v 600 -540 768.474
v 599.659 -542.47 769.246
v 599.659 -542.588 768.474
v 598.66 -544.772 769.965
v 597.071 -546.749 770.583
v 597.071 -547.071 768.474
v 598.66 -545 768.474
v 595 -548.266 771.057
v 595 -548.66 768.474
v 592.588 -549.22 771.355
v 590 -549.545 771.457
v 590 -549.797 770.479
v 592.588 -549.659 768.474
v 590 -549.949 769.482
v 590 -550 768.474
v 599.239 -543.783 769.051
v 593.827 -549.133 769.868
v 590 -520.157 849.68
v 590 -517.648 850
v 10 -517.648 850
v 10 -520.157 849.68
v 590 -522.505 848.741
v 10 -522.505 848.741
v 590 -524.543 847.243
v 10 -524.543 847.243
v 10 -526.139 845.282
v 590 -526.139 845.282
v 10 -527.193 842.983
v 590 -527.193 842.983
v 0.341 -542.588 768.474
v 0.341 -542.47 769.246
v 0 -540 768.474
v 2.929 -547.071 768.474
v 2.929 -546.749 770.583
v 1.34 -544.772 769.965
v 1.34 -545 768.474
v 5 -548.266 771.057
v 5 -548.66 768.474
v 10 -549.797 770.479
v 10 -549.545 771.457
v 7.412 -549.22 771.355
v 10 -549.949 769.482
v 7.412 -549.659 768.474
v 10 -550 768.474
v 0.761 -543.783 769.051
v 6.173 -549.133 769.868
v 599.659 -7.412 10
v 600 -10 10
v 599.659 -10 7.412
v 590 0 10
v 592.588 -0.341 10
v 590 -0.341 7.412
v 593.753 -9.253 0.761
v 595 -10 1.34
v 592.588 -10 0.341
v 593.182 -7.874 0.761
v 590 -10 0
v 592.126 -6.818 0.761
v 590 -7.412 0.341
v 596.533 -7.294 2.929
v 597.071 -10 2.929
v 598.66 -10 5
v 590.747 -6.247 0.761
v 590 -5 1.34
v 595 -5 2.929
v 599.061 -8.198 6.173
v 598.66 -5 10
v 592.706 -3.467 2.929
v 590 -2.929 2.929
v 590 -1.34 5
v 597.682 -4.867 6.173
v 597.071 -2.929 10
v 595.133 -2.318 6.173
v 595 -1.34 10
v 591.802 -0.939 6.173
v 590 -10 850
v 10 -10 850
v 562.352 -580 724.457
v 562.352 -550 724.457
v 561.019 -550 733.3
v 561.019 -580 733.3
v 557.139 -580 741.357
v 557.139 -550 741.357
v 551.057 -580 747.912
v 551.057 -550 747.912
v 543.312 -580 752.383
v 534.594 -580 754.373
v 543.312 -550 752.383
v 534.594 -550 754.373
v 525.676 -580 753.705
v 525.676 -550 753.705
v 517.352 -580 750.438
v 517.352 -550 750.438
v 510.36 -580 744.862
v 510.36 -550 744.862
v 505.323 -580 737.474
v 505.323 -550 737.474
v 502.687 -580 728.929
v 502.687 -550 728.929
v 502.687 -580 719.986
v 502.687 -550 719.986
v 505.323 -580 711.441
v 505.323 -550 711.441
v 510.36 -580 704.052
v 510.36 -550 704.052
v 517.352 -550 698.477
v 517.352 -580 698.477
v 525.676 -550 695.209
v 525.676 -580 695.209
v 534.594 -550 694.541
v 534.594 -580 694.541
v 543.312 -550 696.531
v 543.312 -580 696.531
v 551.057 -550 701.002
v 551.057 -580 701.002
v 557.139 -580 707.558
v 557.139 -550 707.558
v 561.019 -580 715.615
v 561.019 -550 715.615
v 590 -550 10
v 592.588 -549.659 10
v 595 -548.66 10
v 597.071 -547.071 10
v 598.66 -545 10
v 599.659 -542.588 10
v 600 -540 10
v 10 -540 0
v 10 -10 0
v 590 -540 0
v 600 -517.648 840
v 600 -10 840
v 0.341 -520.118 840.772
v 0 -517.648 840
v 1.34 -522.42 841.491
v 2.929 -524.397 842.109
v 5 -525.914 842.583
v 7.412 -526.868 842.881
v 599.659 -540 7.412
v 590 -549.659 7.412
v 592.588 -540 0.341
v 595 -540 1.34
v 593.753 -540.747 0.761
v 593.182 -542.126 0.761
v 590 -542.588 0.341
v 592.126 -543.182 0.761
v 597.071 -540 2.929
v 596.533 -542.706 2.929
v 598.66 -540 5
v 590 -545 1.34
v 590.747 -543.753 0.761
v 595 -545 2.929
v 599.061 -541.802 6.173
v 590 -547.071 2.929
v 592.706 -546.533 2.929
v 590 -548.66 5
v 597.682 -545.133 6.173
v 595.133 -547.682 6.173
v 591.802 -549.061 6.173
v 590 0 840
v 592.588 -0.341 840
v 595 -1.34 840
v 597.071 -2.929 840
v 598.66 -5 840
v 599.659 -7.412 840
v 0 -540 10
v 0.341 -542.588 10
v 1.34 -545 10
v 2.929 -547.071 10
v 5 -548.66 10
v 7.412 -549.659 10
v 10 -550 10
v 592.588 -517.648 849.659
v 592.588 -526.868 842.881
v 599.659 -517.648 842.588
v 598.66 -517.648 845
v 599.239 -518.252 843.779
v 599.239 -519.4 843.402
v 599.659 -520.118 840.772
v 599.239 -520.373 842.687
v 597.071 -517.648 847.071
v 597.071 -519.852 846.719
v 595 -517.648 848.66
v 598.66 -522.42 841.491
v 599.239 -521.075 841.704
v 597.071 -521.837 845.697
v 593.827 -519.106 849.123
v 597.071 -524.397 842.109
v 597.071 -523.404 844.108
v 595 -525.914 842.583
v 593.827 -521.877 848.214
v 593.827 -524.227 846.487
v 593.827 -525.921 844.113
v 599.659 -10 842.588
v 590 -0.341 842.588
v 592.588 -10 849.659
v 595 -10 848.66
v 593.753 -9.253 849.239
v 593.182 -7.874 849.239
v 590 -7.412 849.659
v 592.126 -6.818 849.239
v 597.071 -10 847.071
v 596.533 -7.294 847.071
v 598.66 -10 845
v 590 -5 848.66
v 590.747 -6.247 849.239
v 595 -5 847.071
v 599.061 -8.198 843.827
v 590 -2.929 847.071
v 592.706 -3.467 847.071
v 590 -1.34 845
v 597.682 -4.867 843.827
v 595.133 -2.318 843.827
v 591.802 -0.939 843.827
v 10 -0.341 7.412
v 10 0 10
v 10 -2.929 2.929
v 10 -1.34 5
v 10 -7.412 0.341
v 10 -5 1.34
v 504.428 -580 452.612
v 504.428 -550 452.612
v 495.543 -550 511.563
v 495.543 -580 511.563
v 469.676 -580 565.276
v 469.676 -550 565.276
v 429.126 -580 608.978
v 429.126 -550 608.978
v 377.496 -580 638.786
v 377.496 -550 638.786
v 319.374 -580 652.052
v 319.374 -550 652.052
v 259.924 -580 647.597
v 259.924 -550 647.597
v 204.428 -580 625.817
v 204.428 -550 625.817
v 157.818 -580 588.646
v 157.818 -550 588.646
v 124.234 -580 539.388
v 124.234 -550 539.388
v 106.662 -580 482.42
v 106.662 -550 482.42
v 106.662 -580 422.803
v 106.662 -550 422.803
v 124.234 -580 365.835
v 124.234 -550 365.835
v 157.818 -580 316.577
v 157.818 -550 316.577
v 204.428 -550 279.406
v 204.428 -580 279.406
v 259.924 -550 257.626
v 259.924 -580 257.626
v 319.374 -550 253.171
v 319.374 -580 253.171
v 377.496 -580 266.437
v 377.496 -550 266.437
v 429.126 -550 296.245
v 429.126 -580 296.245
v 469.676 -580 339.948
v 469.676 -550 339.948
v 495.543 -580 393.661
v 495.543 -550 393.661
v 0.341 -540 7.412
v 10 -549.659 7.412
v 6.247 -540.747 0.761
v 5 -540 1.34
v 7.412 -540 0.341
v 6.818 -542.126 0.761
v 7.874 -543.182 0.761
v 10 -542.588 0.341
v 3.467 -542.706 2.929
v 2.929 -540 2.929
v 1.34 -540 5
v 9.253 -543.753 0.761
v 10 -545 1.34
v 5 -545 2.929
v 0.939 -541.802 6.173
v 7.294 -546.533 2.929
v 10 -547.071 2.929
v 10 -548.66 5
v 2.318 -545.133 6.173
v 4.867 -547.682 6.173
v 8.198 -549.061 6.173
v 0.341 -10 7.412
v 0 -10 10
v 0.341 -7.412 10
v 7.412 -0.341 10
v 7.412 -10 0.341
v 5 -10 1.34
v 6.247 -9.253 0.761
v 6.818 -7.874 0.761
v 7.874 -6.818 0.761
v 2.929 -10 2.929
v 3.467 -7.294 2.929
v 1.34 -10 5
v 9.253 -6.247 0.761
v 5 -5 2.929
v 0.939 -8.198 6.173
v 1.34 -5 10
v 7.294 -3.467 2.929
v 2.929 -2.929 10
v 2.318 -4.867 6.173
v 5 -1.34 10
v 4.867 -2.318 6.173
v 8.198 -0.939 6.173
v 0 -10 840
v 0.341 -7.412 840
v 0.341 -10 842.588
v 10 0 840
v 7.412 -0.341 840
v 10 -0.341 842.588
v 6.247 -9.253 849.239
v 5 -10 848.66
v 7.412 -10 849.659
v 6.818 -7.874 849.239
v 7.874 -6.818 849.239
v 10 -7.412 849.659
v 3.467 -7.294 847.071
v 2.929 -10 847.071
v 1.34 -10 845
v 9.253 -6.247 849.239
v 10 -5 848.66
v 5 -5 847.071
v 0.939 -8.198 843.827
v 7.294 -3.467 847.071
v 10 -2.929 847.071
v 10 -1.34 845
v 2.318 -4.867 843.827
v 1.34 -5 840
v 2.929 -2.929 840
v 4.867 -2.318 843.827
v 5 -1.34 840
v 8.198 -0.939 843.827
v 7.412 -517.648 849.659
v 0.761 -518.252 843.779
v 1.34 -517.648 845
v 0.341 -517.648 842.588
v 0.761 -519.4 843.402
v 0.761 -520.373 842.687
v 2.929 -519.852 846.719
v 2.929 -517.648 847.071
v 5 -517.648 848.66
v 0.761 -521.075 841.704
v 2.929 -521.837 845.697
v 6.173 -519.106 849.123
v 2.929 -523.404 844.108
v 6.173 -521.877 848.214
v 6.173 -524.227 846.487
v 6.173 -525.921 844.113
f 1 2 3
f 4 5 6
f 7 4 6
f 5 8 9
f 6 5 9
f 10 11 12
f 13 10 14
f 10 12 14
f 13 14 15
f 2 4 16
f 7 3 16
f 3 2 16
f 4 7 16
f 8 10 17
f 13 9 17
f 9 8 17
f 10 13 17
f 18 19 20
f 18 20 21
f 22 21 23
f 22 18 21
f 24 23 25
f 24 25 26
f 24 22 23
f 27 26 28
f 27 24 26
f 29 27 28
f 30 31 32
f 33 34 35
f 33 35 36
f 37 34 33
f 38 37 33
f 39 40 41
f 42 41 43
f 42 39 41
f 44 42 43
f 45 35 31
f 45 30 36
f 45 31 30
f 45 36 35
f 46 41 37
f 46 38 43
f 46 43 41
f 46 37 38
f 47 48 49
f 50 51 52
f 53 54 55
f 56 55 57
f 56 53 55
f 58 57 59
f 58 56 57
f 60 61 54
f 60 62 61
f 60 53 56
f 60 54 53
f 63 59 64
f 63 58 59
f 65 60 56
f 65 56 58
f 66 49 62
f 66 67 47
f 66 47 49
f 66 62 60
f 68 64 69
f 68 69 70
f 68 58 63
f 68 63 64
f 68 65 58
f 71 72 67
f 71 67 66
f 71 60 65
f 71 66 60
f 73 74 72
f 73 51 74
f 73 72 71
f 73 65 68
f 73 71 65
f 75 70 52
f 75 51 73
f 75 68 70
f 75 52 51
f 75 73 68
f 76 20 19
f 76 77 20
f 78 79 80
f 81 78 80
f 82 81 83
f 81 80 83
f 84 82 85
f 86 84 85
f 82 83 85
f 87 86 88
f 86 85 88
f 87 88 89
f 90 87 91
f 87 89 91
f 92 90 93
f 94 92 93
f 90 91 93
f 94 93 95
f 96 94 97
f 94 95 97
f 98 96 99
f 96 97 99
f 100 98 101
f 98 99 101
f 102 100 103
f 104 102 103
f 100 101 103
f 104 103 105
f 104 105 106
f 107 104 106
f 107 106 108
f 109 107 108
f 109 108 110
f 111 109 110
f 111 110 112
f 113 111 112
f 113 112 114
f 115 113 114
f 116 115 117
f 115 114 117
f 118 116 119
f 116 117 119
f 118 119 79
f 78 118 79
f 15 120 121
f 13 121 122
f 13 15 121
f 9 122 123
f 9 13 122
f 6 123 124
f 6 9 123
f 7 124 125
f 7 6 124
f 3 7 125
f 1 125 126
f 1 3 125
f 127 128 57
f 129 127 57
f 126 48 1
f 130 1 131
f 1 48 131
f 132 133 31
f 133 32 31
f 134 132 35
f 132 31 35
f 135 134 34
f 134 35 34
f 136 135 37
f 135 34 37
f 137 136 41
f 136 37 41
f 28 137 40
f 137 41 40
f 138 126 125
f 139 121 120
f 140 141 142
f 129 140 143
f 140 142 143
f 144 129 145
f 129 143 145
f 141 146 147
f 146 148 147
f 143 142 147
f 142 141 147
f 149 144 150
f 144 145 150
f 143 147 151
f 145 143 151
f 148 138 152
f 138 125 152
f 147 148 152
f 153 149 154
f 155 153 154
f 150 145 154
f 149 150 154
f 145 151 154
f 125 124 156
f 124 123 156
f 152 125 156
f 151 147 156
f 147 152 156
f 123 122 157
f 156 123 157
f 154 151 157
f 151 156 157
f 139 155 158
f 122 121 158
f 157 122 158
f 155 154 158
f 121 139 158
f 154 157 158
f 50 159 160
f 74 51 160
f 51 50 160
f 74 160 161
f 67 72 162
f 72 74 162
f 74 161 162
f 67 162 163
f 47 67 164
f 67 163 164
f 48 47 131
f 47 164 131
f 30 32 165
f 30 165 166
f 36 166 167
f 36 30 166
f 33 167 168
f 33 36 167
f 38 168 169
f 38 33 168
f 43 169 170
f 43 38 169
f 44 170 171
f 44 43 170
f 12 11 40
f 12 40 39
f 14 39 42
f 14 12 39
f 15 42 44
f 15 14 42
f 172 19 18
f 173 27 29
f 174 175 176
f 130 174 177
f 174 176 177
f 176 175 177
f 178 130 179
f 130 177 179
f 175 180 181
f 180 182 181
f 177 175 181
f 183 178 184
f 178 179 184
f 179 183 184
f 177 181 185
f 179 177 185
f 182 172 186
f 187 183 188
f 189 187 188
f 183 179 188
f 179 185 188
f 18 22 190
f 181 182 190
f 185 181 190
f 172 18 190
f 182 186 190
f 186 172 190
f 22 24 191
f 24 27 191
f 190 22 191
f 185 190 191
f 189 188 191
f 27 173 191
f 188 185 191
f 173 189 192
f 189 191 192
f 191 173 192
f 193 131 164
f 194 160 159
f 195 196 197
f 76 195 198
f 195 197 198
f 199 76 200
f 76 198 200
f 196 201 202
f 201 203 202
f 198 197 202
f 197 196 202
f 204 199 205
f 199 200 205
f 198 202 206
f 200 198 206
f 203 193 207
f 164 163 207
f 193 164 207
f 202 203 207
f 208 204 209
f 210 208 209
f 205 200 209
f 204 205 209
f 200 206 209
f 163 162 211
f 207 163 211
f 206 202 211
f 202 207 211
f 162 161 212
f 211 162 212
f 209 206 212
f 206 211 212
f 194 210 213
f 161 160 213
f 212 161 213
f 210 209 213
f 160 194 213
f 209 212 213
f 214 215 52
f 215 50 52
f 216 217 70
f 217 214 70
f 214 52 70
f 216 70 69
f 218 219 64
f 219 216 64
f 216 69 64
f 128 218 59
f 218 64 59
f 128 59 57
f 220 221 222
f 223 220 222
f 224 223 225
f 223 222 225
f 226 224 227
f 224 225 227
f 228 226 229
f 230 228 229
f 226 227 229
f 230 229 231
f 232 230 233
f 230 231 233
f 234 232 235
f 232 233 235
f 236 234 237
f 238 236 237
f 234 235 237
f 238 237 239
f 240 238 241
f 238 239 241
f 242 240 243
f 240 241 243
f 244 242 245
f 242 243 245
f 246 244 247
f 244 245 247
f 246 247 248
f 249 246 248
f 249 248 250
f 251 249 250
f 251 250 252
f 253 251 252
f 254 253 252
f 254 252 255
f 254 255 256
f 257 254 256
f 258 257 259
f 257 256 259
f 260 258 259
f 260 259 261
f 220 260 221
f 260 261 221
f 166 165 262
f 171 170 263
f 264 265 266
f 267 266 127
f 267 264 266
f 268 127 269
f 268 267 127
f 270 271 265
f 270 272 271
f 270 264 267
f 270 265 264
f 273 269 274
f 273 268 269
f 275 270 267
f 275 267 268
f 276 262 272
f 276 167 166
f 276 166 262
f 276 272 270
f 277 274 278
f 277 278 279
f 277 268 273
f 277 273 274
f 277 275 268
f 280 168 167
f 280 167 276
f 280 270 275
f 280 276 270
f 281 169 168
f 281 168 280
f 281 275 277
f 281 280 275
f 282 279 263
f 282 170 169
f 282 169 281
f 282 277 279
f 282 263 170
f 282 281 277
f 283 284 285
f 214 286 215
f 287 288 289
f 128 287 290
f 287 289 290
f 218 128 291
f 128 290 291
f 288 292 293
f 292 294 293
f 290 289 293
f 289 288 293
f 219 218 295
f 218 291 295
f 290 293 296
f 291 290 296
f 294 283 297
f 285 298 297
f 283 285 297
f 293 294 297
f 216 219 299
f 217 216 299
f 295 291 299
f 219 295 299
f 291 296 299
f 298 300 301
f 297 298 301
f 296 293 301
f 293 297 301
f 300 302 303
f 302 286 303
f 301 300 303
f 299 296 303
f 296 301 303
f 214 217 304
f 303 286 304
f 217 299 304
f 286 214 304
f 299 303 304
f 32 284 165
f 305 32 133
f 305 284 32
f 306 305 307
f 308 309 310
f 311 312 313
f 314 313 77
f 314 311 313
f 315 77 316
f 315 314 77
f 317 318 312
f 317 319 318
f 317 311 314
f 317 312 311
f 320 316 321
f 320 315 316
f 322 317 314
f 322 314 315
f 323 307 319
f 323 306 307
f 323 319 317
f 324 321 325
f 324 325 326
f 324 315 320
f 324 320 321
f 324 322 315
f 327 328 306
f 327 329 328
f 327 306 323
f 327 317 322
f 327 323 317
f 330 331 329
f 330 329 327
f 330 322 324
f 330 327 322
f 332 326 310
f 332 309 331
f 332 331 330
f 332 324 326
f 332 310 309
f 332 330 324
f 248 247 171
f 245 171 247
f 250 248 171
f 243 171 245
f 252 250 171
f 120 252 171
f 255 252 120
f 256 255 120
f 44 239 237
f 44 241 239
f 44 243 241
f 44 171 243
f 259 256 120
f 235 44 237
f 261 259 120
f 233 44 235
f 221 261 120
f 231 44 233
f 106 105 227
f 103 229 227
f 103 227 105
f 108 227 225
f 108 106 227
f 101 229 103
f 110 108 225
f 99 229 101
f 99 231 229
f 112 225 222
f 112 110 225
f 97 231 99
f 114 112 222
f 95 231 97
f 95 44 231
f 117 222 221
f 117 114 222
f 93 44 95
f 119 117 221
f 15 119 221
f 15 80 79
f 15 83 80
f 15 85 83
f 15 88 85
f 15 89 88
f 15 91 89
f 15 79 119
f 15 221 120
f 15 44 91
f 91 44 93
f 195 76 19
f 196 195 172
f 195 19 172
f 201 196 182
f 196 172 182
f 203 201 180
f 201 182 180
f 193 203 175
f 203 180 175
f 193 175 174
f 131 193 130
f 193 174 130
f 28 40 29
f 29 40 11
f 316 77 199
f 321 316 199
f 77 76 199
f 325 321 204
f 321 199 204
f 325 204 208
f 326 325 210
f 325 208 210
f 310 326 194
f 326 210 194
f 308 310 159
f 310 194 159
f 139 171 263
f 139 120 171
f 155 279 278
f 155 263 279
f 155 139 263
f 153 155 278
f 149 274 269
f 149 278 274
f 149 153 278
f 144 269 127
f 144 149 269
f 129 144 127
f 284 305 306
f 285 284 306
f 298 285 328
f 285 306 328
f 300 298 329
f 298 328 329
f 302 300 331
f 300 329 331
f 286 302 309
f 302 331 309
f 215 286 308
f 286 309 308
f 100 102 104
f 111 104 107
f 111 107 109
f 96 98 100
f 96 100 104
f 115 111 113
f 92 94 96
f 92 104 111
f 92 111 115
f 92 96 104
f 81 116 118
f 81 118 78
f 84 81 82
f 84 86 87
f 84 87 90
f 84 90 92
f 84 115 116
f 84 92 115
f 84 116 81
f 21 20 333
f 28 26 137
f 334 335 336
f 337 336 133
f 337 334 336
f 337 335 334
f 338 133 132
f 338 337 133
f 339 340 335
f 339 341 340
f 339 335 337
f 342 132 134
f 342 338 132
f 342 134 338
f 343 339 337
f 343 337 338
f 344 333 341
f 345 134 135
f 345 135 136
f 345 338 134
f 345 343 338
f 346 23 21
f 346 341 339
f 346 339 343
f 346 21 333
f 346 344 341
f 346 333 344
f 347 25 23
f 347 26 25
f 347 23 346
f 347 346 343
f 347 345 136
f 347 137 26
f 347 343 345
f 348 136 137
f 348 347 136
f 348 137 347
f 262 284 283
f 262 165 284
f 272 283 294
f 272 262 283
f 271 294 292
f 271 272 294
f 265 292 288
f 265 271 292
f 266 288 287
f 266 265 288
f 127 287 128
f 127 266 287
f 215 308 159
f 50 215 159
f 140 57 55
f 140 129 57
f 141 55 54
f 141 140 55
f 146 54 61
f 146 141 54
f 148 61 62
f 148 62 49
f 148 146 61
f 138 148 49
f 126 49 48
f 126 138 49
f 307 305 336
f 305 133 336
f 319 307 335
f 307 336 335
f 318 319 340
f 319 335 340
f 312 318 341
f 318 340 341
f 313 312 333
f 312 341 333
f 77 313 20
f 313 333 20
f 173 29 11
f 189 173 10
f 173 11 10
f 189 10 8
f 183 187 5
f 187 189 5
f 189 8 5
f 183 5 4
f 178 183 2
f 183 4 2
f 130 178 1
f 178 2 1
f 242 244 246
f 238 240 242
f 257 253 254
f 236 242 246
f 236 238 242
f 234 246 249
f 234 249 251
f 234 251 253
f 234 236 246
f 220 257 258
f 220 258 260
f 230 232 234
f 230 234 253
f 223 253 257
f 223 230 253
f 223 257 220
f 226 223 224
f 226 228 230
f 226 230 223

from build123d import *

# Parameters (mm, degrees)
F0_W     = 600
F0_H     = 850
F1_DEPTH = 550
F2_SIZE2 = 80
F2_SIZE  = 25
F3_R     = 10
F4_R     = 200
F5_DEPTH = 30
F4_R_2   = 30
F6_DEPTH = 30


with BuildPart() as f1:
    # F0 (on Front) → F1 (new body)
    with BuildSketch(Plane.XZ):
        with Locations((300, 425)):
            Rectangle(F0_W, F0_H)
    extrude(amount=F1_DEPTH)

    # F2
    f2_edges = [f1.edges().sort_by_distance(p)[0] for p in [
        (300, -550, 850),
    ]]
    f2_side = f1.faces().sort_by_distance((300, -275, 850))[0]
    chamfer(f2_edges, length=F2_SIZE, length2=F2_SIZE2, reference=f2_side)

    # F3
    f3_edges = [f1.edges().sort_by_distance(p)[0] for p in [
        (0, -550, 385),
        (0, 0, 425),
        (600, -550, 385),
        (600, 0, 425),
        (0, -275, 0),
        (300, -525, 850),
        (300, -550, 770),
        (600, -262.5, 850),
        (0, -262.5, 850),
        (600, -275, 0),
        (600, -537.5, 810),
        (300, -550, 0),
        (0, -537.5, 810),
        (300, 0, 0),
        (300, 0, 850),
    ]]
    fillet(f3_edges, radius=F3_R)

    # F4 (on face) → F5 (join)
    with BuildSketch(Plane.XZ.offset(550)):
        with Locations((304.4280707836, 452.6115655899)):
            Circle(F4_R)
    extrude(amount=F5_DEPTH)

    # F4 (on face) → F6 (join)
    with BuildSketch(Plane.XZ.offset(550)):
        with Locations((532.3519706726, 724.4572639465)):
            Circle(F4_R_2)
    extrude(amount=F6_DEPTH)


solid = f1.part
